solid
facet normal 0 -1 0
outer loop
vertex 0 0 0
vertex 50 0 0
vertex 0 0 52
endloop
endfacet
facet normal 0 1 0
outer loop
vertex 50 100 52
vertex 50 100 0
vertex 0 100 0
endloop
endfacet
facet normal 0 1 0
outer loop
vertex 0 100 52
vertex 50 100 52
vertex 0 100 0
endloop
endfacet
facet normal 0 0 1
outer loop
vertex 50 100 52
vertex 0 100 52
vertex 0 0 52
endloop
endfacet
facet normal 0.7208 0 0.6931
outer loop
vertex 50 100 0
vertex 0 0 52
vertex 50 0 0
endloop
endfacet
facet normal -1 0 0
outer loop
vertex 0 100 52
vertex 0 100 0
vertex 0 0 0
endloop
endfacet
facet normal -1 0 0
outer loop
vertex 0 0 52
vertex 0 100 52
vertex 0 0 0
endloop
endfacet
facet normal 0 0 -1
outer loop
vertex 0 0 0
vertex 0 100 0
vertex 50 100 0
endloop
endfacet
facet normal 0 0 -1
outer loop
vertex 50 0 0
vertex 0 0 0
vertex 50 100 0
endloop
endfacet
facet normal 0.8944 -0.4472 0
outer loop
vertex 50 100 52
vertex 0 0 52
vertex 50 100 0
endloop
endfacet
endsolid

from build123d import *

# Parameters (mm, degrees)
F1_DEPTH = 52
F3_DEPTH = 100


# Not quite as in the source:
# - an extrude ends at something that could not be found from the text; its depth is read off the source's solid


with BuildPart() as f1:
    # F0 (on Top) → F1 (new body)
    with BuildSketch(Plane.XY):
        Polygon((0, 100), (0, 0), (50, 100), align=None)
    extrude(amount=F1_DEPTH)

    # F2 (on face) → F3 (join, through all)
    with BuildSketch(Plane(origin=(0, 100, 0), x_dir=(-1, 0, 0), z_dir=(0, 1, 0))):
        Polygon((0, 52), (-50, 0), (0, 0), align=None)
    extrude(amount=-F3_DEPTH)


solid = f1.part
